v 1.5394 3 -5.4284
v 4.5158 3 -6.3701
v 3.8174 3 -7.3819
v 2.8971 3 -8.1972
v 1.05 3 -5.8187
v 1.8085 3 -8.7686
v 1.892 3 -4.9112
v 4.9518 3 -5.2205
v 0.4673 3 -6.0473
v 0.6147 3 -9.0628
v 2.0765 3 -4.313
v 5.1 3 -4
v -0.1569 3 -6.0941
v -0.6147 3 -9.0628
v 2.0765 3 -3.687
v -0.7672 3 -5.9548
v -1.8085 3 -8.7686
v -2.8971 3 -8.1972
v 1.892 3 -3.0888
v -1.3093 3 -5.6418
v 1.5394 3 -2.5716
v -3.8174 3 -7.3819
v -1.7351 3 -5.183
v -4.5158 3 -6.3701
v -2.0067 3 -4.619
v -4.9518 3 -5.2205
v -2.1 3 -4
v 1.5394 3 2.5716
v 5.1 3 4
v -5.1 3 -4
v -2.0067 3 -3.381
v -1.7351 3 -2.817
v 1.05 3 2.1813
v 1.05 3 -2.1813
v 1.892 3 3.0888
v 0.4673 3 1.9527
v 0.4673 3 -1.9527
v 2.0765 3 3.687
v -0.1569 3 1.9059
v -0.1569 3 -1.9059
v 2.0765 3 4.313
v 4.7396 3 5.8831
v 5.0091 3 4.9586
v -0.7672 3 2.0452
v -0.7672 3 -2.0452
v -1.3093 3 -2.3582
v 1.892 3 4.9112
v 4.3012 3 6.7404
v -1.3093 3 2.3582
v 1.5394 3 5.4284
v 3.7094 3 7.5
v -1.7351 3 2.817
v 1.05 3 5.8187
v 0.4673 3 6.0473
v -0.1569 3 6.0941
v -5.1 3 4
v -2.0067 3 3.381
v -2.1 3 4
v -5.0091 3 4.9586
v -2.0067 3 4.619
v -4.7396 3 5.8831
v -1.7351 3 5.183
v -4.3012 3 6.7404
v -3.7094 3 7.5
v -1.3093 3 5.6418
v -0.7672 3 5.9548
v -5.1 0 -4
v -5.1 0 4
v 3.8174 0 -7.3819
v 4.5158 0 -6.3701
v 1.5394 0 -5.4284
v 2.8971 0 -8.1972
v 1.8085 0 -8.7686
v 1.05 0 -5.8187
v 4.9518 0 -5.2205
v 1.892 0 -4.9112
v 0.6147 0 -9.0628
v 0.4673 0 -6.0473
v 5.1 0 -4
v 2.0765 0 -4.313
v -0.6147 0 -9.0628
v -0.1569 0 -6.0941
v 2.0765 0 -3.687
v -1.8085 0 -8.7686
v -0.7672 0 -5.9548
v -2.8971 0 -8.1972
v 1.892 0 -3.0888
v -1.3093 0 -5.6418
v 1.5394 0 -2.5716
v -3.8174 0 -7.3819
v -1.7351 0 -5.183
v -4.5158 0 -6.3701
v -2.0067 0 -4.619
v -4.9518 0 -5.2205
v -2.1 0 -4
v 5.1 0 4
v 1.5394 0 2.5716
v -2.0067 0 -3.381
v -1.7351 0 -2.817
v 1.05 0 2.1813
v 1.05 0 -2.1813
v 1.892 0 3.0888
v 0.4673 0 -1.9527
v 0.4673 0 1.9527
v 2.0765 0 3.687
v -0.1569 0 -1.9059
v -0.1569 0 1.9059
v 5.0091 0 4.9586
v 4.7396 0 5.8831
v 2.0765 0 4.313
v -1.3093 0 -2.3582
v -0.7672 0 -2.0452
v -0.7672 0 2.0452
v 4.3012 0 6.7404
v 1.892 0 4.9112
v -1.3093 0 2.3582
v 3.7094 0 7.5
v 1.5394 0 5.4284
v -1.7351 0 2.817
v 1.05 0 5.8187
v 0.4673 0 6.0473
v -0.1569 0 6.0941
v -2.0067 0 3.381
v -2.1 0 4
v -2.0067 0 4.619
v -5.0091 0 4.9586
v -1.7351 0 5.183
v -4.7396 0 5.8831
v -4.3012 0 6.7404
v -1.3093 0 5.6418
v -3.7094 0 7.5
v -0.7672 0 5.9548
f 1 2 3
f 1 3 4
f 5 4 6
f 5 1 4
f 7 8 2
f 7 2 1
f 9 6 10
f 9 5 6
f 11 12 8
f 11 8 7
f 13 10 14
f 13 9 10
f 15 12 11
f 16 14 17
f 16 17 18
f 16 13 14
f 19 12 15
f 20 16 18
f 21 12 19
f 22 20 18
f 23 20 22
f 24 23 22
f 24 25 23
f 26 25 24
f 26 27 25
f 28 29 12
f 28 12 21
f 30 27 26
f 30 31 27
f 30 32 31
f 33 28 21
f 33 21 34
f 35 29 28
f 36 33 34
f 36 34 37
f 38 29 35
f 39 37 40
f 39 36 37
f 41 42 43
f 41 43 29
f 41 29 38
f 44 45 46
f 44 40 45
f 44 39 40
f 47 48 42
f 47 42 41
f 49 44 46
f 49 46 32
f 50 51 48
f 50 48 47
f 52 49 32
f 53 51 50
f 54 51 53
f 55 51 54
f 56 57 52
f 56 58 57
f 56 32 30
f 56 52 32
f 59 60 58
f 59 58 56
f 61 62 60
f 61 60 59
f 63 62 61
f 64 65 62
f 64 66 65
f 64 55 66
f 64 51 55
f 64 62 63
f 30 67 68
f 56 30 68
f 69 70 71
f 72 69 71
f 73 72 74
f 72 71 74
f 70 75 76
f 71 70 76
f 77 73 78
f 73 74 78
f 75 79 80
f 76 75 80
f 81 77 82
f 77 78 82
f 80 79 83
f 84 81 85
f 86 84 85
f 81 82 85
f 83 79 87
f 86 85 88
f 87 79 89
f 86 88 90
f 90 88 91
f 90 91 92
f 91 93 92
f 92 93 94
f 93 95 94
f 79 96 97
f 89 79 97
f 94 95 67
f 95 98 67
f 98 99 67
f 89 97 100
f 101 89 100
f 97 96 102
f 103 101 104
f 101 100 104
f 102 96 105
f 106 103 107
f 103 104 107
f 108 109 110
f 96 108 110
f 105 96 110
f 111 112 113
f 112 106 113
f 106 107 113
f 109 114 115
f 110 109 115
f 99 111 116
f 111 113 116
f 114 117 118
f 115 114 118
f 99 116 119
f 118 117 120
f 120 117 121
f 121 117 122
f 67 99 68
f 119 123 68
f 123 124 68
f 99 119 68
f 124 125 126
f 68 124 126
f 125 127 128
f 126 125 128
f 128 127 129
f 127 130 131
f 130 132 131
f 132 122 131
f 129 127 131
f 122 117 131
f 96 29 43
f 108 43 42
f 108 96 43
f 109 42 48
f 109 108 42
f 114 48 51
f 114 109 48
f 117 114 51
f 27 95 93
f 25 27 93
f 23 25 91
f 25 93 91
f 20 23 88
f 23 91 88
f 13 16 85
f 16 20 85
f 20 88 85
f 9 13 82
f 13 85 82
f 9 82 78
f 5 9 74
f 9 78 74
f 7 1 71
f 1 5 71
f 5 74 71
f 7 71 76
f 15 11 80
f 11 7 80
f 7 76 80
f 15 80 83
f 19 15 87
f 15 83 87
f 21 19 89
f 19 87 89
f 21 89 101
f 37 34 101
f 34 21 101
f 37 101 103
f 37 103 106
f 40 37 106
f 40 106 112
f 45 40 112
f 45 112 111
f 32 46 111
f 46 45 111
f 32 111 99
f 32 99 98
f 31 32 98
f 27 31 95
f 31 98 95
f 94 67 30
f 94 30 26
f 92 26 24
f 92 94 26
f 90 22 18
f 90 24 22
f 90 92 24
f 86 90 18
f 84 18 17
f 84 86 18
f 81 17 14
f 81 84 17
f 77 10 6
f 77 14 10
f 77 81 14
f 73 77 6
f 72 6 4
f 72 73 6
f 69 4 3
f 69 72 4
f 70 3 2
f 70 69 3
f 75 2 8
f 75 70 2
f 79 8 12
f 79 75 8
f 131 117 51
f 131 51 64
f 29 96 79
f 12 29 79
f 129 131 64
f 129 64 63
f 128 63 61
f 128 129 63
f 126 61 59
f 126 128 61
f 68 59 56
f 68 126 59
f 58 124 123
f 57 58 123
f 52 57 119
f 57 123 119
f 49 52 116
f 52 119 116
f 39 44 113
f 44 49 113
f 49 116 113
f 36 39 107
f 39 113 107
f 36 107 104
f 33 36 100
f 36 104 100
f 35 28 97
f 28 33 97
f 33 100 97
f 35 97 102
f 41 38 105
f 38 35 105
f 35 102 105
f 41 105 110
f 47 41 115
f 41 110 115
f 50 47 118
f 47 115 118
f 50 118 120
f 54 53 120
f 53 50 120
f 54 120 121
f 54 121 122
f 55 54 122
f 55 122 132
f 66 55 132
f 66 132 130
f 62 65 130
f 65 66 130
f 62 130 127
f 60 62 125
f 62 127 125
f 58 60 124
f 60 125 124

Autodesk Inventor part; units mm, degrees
ref_plane "YZ Plane" through (0, 0, 0) normal (1, 0, 0) x (0, 1, 0)
ref_plane "XZ Plane" through (0, 0, 0) normal (0, 1, 0) x (-1, 0, 0)
ref_plane "XY Plane" through (0, 0, 0) normal (0, 0, 1) x (1, 0, 0)
sketch "Skizze1" plane through (0, 0, 0) normal (0, 1, 0) x (-1, 0, 0)
  circle A0 centre (0, 4) radius 2.1
  circle A1 centre (0, -4) radius 2.1
  line L0 (0, 4) -> (0, -4) construction
  line L1 (0, 4) -> (0, -4) construction
  line L2 (-5.1, 4) -> (-5.1, -4)
  line L3 (5.1, -4) -> (5.1, 4)
  arc A2 (5.1, 4) -> (-5.1, 4) centre (0, 4) ccw
  arc A3 (-5.1, -4) -> (5.1, -4) centre (0, -4) ccw
  point P0 (0, 0)
  point P1 (0, 0)
  point P2 (0, 0)
  dimension "d0" = 4.2
  dimension "d1" = 3
  dimension "d2" = 8
extrude "Extrusion1" add sketch "Skizze1" along normal blind 3
sketch "Skizze2" plane through (0, 0, 0) normal (0, -1, 0) x (1, 0, 0)
  arc A0 (5.1, 4) -> (-5.1, 4) centre (0, 4) ccw construction
  line L0 (3.7094, 7.5) -> (-3.7094, 7.5)
  arc A1 (3.7094, 7.5) -> (-3.7094, 7.5) centre (0, 4) ccw
  arc A2 (5.1, 4) -> (-5.1, 4) centre (0, 4) ccw projected
  point P0 (0, 0)
  dimension "d5" = 3.5
extrude "Extrusion2" cut sketch "Skizze2" against normal blind 10
properties part number "_3D-Druck"
